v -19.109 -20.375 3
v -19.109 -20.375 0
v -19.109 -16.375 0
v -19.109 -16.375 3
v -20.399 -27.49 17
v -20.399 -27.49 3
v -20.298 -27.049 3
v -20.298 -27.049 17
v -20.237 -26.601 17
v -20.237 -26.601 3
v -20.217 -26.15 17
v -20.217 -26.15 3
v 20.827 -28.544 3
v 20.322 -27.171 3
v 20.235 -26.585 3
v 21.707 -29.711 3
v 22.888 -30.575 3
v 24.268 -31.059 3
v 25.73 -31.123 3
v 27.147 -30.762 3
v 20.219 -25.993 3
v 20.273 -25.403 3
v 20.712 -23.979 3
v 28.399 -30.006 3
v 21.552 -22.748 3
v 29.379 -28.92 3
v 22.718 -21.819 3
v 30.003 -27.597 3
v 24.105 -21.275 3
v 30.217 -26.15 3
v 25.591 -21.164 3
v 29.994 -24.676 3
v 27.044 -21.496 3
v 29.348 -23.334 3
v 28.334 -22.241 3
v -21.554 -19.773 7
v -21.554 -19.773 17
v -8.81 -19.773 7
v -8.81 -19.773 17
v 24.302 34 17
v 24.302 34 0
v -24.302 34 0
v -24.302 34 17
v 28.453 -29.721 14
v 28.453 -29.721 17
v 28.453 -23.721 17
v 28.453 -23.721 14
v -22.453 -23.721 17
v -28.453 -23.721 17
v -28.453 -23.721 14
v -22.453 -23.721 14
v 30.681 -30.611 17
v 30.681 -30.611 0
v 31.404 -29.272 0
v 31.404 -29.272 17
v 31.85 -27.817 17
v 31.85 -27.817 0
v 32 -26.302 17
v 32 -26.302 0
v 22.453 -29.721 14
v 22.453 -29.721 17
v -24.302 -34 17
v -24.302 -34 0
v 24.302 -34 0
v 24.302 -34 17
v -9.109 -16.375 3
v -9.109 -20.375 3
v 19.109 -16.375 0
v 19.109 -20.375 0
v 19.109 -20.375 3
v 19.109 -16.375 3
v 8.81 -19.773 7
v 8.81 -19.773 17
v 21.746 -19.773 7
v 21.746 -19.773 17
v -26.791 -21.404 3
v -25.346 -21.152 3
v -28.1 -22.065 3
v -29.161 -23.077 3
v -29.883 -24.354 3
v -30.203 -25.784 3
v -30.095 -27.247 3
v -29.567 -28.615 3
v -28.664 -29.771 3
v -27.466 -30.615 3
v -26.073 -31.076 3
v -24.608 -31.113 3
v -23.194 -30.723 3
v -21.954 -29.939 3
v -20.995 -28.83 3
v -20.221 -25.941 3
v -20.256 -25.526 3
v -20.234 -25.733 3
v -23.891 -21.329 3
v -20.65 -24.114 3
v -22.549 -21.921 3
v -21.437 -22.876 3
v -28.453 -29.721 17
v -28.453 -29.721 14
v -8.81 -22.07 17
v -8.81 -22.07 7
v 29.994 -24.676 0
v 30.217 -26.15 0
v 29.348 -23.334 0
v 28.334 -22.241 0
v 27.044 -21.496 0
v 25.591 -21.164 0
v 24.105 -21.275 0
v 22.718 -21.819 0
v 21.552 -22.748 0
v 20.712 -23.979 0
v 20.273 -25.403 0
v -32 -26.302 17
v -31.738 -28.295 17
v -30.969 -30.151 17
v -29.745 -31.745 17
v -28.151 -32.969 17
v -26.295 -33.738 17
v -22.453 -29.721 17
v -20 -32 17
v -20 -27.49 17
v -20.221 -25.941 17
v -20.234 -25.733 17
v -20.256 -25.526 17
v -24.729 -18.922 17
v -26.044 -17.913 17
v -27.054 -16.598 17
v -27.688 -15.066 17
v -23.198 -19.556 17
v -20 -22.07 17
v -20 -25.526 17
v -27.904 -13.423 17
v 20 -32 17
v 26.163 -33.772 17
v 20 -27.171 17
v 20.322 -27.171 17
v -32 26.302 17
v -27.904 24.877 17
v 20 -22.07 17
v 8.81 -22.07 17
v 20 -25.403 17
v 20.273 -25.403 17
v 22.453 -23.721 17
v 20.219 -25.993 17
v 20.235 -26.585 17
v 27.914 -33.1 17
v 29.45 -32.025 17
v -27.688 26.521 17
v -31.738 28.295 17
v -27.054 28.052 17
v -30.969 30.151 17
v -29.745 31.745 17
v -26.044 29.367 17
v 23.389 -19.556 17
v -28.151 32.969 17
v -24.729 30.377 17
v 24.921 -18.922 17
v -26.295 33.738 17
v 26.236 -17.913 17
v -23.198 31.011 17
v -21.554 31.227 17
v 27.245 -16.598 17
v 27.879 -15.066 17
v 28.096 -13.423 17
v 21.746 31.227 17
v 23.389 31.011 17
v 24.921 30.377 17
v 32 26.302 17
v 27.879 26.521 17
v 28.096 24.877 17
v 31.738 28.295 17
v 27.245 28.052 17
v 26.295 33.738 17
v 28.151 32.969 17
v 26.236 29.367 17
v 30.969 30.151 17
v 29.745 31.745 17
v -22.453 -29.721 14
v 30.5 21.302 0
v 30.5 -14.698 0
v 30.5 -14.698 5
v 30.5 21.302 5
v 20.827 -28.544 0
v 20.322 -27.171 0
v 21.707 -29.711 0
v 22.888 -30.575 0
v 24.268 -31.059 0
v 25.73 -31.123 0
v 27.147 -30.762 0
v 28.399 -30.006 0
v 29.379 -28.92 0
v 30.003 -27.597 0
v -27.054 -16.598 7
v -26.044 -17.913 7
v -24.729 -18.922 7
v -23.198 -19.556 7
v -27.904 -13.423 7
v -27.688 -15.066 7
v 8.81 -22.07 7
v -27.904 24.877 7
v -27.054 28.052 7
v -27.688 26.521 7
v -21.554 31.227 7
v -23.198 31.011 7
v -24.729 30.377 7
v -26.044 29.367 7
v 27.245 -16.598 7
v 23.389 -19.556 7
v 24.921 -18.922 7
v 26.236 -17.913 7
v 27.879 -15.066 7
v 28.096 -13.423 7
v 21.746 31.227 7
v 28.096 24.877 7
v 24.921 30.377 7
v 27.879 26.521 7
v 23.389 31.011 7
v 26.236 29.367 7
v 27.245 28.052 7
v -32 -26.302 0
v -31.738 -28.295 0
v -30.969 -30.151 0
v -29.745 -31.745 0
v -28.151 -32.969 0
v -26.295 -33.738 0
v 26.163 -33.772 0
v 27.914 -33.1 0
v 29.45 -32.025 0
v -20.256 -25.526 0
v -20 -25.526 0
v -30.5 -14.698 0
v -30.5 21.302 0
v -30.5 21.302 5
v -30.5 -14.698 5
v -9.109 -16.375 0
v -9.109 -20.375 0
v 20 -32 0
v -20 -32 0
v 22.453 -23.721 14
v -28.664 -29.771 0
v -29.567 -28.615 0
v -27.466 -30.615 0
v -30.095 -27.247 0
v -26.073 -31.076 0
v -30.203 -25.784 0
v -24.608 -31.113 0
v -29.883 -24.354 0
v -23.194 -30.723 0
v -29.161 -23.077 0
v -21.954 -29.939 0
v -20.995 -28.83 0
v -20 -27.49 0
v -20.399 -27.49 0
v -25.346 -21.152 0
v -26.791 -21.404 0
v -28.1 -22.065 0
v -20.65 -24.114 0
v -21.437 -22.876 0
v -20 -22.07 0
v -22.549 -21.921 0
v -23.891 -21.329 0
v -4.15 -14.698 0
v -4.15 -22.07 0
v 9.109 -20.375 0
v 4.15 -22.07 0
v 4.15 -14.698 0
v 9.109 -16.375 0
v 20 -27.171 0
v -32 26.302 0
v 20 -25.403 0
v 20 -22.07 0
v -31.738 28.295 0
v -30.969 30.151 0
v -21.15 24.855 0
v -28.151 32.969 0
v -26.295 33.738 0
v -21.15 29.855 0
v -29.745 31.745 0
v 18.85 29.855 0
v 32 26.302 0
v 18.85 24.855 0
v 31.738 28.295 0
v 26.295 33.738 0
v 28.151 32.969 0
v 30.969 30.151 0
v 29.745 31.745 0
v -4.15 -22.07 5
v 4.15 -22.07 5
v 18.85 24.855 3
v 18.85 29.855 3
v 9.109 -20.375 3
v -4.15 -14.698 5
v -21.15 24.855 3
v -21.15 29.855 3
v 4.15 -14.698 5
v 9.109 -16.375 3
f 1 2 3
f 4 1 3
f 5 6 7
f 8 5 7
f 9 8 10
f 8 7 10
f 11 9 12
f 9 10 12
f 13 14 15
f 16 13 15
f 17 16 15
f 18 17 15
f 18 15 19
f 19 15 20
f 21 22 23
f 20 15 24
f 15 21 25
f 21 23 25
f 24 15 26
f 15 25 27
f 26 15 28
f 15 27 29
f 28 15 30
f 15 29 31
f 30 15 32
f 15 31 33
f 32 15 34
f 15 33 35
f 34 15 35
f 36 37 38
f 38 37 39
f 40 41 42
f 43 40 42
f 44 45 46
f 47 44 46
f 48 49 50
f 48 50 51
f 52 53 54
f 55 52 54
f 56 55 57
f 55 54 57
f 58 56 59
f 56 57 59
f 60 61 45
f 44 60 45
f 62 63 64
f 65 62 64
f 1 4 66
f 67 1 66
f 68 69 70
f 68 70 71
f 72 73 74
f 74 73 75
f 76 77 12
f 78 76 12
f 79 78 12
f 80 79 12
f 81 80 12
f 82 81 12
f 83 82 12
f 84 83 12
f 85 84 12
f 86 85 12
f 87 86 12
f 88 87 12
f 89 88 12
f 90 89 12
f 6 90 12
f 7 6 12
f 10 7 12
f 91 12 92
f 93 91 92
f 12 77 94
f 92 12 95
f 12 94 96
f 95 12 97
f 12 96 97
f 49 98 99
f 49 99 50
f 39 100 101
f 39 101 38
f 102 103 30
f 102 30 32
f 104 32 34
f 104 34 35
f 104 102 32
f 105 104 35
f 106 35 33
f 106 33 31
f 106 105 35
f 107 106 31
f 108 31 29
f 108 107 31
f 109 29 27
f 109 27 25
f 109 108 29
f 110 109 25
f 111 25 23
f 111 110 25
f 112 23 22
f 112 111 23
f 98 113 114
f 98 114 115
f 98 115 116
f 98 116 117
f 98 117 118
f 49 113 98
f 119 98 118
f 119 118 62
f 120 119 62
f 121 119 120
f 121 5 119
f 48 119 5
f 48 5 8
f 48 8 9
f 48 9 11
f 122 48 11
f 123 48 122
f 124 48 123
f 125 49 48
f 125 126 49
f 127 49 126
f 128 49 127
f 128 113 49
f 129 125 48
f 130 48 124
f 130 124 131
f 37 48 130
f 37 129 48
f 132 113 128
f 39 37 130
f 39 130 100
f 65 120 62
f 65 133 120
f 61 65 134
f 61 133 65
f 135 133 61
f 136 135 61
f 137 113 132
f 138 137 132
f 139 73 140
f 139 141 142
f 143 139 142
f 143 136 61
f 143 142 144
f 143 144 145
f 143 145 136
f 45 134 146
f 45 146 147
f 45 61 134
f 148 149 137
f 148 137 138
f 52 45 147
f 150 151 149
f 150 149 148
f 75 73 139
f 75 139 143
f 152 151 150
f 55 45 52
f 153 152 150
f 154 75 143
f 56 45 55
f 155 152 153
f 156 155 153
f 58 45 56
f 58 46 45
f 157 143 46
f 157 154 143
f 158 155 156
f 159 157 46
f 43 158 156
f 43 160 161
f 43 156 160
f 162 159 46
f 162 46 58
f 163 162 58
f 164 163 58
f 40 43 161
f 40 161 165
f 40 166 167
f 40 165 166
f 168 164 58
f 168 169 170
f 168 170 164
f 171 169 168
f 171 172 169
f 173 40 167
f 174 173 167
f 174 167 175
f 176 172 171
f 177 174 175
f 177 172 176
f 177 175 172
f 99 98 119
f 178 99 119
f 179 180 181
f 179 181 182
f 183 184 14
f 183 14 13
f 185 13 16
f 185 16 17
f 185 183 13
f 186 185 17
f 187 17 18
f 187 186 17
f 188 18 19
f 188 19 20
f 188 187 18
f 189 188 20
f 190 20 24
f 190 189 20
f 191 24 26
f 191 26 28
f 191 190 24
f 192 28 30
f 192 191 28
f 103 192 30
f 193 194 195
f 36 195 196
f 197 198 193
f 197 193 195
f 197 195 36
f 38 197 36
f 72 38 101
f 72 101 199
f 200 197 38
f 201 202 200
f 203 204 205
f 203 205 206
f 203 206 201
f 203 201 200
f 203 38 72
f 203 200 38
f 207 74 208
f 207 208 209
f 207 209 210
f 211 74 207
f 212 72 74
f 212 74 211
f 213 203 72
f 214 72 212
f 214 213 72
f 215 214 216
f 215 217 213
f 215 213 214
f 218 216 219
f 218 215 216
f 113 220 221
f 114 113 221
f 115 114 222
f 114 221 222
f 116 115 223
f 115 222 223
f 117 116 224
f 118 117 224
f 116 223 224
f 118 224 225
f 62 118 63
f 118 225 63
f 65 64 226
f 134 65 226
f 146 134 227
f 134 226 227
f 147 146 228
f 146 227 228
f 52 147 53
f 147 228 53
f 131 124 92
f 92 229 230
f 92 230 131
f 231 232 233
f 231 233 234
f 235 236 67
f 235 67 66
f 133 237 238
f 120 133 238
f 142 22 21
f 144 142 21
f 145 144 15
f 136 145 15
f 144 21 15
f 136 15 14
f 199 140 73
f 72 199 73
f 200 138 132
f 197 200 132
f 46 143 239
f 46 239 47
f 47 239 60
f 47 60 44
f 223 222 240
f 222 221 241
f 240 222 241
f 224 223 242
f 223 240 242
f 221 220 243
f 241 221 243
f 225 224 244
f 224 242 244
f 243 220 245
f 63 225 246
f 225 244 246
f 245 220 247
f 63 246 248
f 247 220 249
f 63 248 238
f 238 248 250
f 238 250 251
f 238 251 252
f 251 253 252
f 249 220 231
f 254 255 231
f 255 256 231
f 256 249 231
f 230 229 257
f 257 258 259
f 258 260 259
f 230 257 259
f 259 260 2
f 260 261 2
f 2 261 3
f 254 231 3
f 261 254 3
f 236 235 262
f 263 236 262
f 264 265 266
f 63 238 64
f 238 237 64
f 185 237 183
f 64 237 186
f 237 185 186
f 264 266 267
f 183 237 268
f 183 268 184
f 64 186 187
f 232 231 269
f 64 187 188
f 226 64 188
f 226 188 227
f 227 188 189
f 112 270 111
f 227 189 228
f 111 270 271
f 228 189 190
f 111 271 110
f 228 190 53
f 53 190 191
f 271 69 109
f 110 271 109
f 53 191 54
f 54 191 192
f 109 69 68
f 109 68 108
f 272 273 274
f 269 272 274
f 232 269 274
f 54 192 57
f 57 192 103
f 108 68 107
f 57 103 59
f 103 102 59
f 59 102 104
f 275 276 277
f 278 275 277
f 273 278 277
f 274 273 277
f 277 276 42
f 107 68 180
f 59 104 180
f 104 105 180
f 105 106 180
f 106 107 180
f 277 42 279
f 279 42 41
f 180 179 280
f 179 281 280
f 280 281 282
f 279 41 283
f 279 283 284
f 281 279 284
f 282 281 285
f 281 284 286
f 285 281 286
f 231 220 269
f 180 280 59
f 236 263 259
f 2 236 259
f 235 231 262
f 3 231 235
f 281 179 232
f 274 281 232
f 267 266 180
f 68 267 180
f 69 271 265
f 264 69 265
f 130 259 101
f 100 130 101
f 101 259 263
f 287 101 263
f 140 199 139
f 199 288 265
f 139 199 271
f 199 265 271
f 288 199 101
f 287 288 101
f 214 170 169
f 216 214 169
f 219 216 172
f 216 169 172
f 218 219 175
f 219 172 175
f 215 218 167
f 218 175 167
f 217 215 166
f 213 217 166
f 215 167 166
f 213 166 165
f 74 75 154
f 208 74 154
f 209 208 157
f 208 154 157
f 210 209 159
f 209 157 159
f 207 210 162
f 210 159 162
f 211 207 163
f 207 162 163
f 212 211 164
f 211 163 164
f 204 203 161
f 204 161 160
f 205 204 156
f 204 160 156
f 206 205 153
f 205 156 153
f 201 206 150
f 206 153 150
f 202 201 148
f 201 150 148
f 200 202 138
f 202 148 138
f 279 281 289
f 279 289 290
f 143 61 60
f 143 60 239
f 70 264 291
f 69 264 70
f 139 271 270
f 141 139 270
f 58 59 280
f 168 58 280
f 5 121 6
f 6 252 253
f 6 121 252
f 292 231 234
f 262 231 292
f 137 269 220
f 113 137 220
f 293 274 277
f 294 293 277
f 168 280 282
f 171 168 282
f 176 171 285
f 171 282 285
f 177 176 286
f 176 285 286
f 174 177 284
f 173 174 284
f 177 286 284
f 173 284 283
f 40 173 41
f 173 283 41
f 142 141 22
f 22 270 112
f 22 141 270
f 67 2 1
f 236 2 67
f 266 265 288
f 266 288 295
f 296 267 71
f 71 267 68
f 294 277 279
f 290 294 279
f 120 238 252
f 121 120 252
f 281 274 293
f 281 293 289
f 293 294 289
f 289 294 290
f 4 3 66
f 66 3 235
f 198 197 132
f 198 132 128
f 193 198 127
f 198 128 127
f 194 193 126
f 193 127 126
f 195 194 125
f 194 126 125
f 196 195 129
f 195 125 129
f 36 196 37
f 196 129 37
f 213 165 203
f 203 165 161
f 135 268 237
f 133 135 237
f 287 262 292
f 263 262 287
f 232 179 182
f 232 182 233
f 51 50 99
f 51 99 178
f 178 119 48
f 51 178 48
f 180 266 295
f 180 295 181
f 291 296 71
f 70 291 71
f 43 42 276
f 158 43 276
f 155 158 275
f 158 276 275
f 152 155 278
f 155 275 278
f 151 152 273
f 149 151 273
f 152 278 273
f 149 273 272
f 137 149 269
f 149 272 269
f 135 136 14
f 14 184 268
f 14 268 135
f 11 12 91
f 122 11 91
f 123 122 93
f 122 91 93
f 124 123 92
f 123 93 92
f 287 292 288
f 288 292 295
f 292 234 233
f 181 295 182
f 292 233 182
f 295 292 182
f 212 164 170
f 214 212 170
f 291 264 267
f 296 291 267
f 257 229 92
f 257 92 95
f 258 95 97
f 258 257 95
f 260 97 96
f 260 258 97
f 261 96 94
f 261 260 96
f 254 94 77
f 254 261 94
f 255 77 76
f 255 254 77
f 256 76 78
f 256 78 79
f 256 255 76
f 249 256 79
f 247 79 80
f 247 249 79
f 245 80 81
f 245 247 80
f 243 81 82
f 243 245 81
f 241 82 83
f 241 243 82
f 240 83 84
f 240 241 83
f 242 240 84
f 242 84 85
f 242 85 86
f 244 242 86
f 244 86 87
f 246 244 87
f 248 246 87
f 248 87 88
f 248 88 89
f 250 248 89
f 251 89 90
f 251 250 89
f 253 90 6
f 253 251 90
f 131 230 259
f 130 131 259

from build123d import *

# Parameters (mm, degrees)
F1_DEPTH  = 17
F2_DEPTH  = 5
F3_DEPTH  = 17
F4_DEPTH  = 3
F5_W      = 17.619991675
F5_H      = 2.2976936506
F6_DEPTH  = 10
F7_W      = 10
F7_H      = 4
F7_W_2    = 40
F7_H_2    = 5
F8_DEPTH  = 3
F9_W      = 6
F9_H      = 6
F10_DEPTH = 3


# Not quite as in the source:
# - a feature names something its author has since deleted; it is built from what else it names


with BuildPart() as f1:
    # F0 (on Top) → F1 (new body)
    with BuildSketch(Plane.XY):
        with BuildLine():
            Line((24.3022678875, 34), (-24.3022678875, 34))
            ThreePointArc((-24.3022678875, 34), (-29.745386464, 31.745386464), (-32, 26.3022678875))
            Line((-32, 26.3022678875), (-32, 15.1276998222))
            Line((-32, 15.1276998222), (-30.5, 15.1276998222))
            Line((-30.5, 15.1276998222), (-30.5, 21.3020170704))
            Line((-30.5, 21.3020170704), (30.5, 21.3020170704))
            Line((30.5, 21.3020170704), (30.5, 14.2477769405))
            Line((30.5, 14.2477769405), (32, 14.2477769405))
            Line((32, 14.2477769405), (32, 26.3022678875))
            ThreePointArc((32, 26.3022678875), (29.745386464, 31.745386464), (24.3022678875, 34))
        make_face()
        with BuildLine():
            Line((-30.5, 15.1276998222), (-32, 15.1276998222))
            Line((-32, 15.1276998222), (-32, -26.3022678875))
            ThreePointArc((-32, -26.3022678875), (-29.745386464, -31.745386464), (-24.3022678875, -34))
            Line((-24.3022678875, -34), (0, -34))
            Line((0, -34), (0, -32))
            Line((0, -32), (-20, -32))
            Line((-20, -32), (-20, -27.4899639189))
            Line((-20, -27.4899639189), (-20.3994758379, -27.4899639189))
            ThreePointArc((-20.3994758379, -27.4899639189), (-30.2031719041, -25.7844938681), (-20.255592559, -25.5261339915))
            Line((-20.255592559, -25.5261339915), (-20, -25.5261339915))
            Line((-20, -25.5261339915), (-20, -22.0704134554))
            Line((-20, -22.0704134554), (-4.1499226354, -22.0704134554))
            Line((-4.1499226354, -22.0704134554), (-4.1499226354, -14.6979829296))
            Line((-4.1499226354, -14.6979829296), (-30.5, -14.6979829296))
            Line((-30.5, -14.6979829296), (-30.5, 15.1276998222))
        make_face()
        with BuildLine():
            Line((32, -26.3022678875), (32, 14.2477769405))
            Line((32, 14.2477769405), (30.5, 14.2477769405))
            Line((30.5, 14.2477769405), (30.5, -14.6979829296))
            Line((30.5, -14.6979829296), (4.1499226354, -14.6979829296))
            Line((4.1499226354, -14.6979829296), (4.1499226354, -22.0704134554))
            Line((4.1499226354, -22.0704134554), (20, -22.0704134554))
            Line((20, -22.0704134554), (20, -25.4029799253))
            Line((20, -25.4029799253), (20.2726339823, -25.4029799253))
            ThreePointArc((20.2726339823, -25.4029799253), (25.5910239568, -21.1638916046), (30.2165381279, -26.1498479185))
            ThreePointArc((30.2165381279, -26.1498479185), (25.7296627026, -31.1234485429), (20.3218568596, -27.1706786007))
            Line((20.3218568596, -27.1706786007), (20, -27.1706786007))
            Line((20, -27.1706786007), (20, -32))
            Line((20, -32), (0, -32))
            Line((0, -32), (0, -34))
            Line((0, -34), (24.3022678875, -34))
            ThreePointArc((24.3022678875, -34), (27.9138443036, -33.100178998), (30.6810753302, -30.6110838832))
            ThreePointArc((30.6810753302, -30.6110838832), (31.6628871063, -28.555346757), (32, -26.3022678875))
        make_face()
        Polygon((-30.5, 21.3020170704), (-30.5, 15.1276998222), (-30.5, -14.6979829296), (-4.1499226354, -14.6979829296), (4.1499226354, -14.6979829296), (30.5, -14.6979829296), (30.5, 14.2477769405), (30.5, 21.3020170704), align=None)
        Polygon((4.1499226354, -14.6979829296), (-4.1499226354, -14.6979829296), (-4.1499226354, -22.0704134554), (0, -22.0704134554), (4.1499226354, -22.0704134554), align=None)
        with BuildLine():
            ThreePointArc((20.2726339823, -25.4029799253), (20.2184754644, -26.2890226707), (20.3218568596, -27.1706786007))
            ThreePointArc((20.3218568596, -27.1706786007), (25.7296627026, -31.1234485429), (30.2165381279, -26.1498479185))
            ThreePointArc((30.2165381279, -26.1498479185), (25.5910239568, -21.1638916046), (20.2726339823, -25.4029799253))
        make_face()
    extrude(amount=F1_DEPTH)

    # F0 (on Top) → F2 (cut)
    with BuildSketch(Plane.XY):
        Polygon((-30.5, 21.3020170704), (-30.5, 15.1276998222), (-30.5, -14.6979829296), (-4.1499226354, -14.6979829296), (4.1499226354, -14.6979829296), (30.5, -14.6979829296), (30.5, 14.2477769405), (30.5, 21.3020170704), align=None)
        Polygon((4.1499226354, -14.6979829296), (-4.1499226354, -14.6979829296), (-4.1499226354, -22.0704134554), (0, -22.0704134554), (4.1499226354, -22.0704134554), align=None)
    extrude(amount=F2_DEPTH, mode=Mode.SUBTRACT)

    # F0 (on Top) → F3 (join)
    with BuildSketch(Plane.XY):
        with BuildLine():
            ThreePointArc((-20.255592559, -25.5261339915), (-30.2031719041, -25.7844938681), (-20.3994758379, -27.4899639189))
            ThreePointArc((-20.3994758379, -27.4899639189), (-20.2624836545, -26.8261202565), (-20.2165381279, -26.1498479185))
            ThreePointArc((-20.2165381279, -26.1498479185), (-20.2263112871, -25.8373801956), (-20.255592559, -25.5261339915))
        make_face()
    extrude(amount=F3_DEPTH)

    # F0 (on Top) → F4 (cut)
    with BuildSketch(Plane.XY):
        with BuildLine():
            ThreePointArc((20.2726339823, -25.4029799253), (20.2184754644, -26.2890226707), (20.3218568596, -27.1706786007))
            ThreePointArc((20.3218568596, -27.1706786007), (25.7296627026, -31.1234485429), (30.2165381279, -26.1498479185))
            ThreePointArc((30.2165381279, -26.1498479185), (25.5910239568, -21.1638916046), (20.2726339823, -25.4029799253))
        make_face()
        with BuildLine():
            ThreePointArc((-20.255592559, -25.5261339915), (-30.2031719041, -25.7844938681), (-20.3994758379, -27.4899639189))
            ThreePointArc((-20.3994758379, -27.4899639189), (-20.2624836545, -26.8261202565), (-20.2165381279, -26.1498479185))
            ThreePointArc((-20.2165381279, -26.1498479185), (-20.2263112871, -25.8373801956), (-20.255592559, -25.5261339915))
        make_face()
    extrude(amount=F4_DEPTH, mode=Mode.SUBTRACT)

    # F5 (on face) → F6 (cut)
    with BuildSketch(Plane.XY.offset(17)):
        with BuildLine():
            Line((21.7456496224, 31.2272801952), (-21.5543503776, 31.2272801952))
            ThreePointArc((-21.5543503776, 31.2272801952), (-26.0444784382, 29.3674082557), (-27.9043503776, 24.8772801952))
            Line((-27.9043503776, 24.8772801952), (-27.9043503776, -13.4227198048))
            ThreePointArc((-27.9043503776, -13.4227198048), (-26.0444784382, -17.9128478653), (-21.5543503776, -19.7727198048))
            Line((-21.5543503776, -19.7727198048), (-8.8099958375, -19.7727198048))
            Line((-8.8099958375, -19.7727198048), (8.8099958375, -19.7727198048))
            Line((8.8099958375, -19.7727198048), (21.7456496224, -19.7727198048))
            ThreePointArc((21.7456496224, -19.7727198048), (26.2357776829, -17.9128478653), (28.0956496224, -13.4227198048))
            Line((28.0956496224, -13.4227198048), (28.0956496224, 24.8772801952))
            ThreePointArc((28.0956496224, 24.8772801952), (26.2357776829, 29.3674082557), (21.7456496224, 31.2272801952))
        make_face()
        with Locations((0, -20.9215666301)):
            Rectangle(F5_W, F5_H)
    extrude(amount=-F6_DEPTH, mode=Mode.SUBTRACT)

    # F7 (on face) → F8 (cut)
    with BuildSketch(Plane.XY):
        with Locations((-14.1091264039, -18.375430584)):
            Rectangle(F7_W, F7_H)
        with Locations((14.1091264039, -18.375430584)):
            Rectangle(F7_W, F7_H)
        with Locations((-1.1501409858, 27.3545110226)):
            Rectangle(F7_W_2, F7_H_2)
    extrude(amount=F8_DEPTH, mode=Mode.SUBTRACT)

    # F9 (on face) → F10 (cut)
    with BuildSketch(Plane.XY.offset(17)):
        with Locations((25.4528271034, -26.7212770808)):
            Rectangle(F9_W, F9_H)
        with Locations((-25.4528271034, -26.7212770808)):
            Rectangle(F9_W, F9_H)
    extrude(amount=-F10_DEPTH, mode=Mode.SUBTRACT)


solid = f1.part
